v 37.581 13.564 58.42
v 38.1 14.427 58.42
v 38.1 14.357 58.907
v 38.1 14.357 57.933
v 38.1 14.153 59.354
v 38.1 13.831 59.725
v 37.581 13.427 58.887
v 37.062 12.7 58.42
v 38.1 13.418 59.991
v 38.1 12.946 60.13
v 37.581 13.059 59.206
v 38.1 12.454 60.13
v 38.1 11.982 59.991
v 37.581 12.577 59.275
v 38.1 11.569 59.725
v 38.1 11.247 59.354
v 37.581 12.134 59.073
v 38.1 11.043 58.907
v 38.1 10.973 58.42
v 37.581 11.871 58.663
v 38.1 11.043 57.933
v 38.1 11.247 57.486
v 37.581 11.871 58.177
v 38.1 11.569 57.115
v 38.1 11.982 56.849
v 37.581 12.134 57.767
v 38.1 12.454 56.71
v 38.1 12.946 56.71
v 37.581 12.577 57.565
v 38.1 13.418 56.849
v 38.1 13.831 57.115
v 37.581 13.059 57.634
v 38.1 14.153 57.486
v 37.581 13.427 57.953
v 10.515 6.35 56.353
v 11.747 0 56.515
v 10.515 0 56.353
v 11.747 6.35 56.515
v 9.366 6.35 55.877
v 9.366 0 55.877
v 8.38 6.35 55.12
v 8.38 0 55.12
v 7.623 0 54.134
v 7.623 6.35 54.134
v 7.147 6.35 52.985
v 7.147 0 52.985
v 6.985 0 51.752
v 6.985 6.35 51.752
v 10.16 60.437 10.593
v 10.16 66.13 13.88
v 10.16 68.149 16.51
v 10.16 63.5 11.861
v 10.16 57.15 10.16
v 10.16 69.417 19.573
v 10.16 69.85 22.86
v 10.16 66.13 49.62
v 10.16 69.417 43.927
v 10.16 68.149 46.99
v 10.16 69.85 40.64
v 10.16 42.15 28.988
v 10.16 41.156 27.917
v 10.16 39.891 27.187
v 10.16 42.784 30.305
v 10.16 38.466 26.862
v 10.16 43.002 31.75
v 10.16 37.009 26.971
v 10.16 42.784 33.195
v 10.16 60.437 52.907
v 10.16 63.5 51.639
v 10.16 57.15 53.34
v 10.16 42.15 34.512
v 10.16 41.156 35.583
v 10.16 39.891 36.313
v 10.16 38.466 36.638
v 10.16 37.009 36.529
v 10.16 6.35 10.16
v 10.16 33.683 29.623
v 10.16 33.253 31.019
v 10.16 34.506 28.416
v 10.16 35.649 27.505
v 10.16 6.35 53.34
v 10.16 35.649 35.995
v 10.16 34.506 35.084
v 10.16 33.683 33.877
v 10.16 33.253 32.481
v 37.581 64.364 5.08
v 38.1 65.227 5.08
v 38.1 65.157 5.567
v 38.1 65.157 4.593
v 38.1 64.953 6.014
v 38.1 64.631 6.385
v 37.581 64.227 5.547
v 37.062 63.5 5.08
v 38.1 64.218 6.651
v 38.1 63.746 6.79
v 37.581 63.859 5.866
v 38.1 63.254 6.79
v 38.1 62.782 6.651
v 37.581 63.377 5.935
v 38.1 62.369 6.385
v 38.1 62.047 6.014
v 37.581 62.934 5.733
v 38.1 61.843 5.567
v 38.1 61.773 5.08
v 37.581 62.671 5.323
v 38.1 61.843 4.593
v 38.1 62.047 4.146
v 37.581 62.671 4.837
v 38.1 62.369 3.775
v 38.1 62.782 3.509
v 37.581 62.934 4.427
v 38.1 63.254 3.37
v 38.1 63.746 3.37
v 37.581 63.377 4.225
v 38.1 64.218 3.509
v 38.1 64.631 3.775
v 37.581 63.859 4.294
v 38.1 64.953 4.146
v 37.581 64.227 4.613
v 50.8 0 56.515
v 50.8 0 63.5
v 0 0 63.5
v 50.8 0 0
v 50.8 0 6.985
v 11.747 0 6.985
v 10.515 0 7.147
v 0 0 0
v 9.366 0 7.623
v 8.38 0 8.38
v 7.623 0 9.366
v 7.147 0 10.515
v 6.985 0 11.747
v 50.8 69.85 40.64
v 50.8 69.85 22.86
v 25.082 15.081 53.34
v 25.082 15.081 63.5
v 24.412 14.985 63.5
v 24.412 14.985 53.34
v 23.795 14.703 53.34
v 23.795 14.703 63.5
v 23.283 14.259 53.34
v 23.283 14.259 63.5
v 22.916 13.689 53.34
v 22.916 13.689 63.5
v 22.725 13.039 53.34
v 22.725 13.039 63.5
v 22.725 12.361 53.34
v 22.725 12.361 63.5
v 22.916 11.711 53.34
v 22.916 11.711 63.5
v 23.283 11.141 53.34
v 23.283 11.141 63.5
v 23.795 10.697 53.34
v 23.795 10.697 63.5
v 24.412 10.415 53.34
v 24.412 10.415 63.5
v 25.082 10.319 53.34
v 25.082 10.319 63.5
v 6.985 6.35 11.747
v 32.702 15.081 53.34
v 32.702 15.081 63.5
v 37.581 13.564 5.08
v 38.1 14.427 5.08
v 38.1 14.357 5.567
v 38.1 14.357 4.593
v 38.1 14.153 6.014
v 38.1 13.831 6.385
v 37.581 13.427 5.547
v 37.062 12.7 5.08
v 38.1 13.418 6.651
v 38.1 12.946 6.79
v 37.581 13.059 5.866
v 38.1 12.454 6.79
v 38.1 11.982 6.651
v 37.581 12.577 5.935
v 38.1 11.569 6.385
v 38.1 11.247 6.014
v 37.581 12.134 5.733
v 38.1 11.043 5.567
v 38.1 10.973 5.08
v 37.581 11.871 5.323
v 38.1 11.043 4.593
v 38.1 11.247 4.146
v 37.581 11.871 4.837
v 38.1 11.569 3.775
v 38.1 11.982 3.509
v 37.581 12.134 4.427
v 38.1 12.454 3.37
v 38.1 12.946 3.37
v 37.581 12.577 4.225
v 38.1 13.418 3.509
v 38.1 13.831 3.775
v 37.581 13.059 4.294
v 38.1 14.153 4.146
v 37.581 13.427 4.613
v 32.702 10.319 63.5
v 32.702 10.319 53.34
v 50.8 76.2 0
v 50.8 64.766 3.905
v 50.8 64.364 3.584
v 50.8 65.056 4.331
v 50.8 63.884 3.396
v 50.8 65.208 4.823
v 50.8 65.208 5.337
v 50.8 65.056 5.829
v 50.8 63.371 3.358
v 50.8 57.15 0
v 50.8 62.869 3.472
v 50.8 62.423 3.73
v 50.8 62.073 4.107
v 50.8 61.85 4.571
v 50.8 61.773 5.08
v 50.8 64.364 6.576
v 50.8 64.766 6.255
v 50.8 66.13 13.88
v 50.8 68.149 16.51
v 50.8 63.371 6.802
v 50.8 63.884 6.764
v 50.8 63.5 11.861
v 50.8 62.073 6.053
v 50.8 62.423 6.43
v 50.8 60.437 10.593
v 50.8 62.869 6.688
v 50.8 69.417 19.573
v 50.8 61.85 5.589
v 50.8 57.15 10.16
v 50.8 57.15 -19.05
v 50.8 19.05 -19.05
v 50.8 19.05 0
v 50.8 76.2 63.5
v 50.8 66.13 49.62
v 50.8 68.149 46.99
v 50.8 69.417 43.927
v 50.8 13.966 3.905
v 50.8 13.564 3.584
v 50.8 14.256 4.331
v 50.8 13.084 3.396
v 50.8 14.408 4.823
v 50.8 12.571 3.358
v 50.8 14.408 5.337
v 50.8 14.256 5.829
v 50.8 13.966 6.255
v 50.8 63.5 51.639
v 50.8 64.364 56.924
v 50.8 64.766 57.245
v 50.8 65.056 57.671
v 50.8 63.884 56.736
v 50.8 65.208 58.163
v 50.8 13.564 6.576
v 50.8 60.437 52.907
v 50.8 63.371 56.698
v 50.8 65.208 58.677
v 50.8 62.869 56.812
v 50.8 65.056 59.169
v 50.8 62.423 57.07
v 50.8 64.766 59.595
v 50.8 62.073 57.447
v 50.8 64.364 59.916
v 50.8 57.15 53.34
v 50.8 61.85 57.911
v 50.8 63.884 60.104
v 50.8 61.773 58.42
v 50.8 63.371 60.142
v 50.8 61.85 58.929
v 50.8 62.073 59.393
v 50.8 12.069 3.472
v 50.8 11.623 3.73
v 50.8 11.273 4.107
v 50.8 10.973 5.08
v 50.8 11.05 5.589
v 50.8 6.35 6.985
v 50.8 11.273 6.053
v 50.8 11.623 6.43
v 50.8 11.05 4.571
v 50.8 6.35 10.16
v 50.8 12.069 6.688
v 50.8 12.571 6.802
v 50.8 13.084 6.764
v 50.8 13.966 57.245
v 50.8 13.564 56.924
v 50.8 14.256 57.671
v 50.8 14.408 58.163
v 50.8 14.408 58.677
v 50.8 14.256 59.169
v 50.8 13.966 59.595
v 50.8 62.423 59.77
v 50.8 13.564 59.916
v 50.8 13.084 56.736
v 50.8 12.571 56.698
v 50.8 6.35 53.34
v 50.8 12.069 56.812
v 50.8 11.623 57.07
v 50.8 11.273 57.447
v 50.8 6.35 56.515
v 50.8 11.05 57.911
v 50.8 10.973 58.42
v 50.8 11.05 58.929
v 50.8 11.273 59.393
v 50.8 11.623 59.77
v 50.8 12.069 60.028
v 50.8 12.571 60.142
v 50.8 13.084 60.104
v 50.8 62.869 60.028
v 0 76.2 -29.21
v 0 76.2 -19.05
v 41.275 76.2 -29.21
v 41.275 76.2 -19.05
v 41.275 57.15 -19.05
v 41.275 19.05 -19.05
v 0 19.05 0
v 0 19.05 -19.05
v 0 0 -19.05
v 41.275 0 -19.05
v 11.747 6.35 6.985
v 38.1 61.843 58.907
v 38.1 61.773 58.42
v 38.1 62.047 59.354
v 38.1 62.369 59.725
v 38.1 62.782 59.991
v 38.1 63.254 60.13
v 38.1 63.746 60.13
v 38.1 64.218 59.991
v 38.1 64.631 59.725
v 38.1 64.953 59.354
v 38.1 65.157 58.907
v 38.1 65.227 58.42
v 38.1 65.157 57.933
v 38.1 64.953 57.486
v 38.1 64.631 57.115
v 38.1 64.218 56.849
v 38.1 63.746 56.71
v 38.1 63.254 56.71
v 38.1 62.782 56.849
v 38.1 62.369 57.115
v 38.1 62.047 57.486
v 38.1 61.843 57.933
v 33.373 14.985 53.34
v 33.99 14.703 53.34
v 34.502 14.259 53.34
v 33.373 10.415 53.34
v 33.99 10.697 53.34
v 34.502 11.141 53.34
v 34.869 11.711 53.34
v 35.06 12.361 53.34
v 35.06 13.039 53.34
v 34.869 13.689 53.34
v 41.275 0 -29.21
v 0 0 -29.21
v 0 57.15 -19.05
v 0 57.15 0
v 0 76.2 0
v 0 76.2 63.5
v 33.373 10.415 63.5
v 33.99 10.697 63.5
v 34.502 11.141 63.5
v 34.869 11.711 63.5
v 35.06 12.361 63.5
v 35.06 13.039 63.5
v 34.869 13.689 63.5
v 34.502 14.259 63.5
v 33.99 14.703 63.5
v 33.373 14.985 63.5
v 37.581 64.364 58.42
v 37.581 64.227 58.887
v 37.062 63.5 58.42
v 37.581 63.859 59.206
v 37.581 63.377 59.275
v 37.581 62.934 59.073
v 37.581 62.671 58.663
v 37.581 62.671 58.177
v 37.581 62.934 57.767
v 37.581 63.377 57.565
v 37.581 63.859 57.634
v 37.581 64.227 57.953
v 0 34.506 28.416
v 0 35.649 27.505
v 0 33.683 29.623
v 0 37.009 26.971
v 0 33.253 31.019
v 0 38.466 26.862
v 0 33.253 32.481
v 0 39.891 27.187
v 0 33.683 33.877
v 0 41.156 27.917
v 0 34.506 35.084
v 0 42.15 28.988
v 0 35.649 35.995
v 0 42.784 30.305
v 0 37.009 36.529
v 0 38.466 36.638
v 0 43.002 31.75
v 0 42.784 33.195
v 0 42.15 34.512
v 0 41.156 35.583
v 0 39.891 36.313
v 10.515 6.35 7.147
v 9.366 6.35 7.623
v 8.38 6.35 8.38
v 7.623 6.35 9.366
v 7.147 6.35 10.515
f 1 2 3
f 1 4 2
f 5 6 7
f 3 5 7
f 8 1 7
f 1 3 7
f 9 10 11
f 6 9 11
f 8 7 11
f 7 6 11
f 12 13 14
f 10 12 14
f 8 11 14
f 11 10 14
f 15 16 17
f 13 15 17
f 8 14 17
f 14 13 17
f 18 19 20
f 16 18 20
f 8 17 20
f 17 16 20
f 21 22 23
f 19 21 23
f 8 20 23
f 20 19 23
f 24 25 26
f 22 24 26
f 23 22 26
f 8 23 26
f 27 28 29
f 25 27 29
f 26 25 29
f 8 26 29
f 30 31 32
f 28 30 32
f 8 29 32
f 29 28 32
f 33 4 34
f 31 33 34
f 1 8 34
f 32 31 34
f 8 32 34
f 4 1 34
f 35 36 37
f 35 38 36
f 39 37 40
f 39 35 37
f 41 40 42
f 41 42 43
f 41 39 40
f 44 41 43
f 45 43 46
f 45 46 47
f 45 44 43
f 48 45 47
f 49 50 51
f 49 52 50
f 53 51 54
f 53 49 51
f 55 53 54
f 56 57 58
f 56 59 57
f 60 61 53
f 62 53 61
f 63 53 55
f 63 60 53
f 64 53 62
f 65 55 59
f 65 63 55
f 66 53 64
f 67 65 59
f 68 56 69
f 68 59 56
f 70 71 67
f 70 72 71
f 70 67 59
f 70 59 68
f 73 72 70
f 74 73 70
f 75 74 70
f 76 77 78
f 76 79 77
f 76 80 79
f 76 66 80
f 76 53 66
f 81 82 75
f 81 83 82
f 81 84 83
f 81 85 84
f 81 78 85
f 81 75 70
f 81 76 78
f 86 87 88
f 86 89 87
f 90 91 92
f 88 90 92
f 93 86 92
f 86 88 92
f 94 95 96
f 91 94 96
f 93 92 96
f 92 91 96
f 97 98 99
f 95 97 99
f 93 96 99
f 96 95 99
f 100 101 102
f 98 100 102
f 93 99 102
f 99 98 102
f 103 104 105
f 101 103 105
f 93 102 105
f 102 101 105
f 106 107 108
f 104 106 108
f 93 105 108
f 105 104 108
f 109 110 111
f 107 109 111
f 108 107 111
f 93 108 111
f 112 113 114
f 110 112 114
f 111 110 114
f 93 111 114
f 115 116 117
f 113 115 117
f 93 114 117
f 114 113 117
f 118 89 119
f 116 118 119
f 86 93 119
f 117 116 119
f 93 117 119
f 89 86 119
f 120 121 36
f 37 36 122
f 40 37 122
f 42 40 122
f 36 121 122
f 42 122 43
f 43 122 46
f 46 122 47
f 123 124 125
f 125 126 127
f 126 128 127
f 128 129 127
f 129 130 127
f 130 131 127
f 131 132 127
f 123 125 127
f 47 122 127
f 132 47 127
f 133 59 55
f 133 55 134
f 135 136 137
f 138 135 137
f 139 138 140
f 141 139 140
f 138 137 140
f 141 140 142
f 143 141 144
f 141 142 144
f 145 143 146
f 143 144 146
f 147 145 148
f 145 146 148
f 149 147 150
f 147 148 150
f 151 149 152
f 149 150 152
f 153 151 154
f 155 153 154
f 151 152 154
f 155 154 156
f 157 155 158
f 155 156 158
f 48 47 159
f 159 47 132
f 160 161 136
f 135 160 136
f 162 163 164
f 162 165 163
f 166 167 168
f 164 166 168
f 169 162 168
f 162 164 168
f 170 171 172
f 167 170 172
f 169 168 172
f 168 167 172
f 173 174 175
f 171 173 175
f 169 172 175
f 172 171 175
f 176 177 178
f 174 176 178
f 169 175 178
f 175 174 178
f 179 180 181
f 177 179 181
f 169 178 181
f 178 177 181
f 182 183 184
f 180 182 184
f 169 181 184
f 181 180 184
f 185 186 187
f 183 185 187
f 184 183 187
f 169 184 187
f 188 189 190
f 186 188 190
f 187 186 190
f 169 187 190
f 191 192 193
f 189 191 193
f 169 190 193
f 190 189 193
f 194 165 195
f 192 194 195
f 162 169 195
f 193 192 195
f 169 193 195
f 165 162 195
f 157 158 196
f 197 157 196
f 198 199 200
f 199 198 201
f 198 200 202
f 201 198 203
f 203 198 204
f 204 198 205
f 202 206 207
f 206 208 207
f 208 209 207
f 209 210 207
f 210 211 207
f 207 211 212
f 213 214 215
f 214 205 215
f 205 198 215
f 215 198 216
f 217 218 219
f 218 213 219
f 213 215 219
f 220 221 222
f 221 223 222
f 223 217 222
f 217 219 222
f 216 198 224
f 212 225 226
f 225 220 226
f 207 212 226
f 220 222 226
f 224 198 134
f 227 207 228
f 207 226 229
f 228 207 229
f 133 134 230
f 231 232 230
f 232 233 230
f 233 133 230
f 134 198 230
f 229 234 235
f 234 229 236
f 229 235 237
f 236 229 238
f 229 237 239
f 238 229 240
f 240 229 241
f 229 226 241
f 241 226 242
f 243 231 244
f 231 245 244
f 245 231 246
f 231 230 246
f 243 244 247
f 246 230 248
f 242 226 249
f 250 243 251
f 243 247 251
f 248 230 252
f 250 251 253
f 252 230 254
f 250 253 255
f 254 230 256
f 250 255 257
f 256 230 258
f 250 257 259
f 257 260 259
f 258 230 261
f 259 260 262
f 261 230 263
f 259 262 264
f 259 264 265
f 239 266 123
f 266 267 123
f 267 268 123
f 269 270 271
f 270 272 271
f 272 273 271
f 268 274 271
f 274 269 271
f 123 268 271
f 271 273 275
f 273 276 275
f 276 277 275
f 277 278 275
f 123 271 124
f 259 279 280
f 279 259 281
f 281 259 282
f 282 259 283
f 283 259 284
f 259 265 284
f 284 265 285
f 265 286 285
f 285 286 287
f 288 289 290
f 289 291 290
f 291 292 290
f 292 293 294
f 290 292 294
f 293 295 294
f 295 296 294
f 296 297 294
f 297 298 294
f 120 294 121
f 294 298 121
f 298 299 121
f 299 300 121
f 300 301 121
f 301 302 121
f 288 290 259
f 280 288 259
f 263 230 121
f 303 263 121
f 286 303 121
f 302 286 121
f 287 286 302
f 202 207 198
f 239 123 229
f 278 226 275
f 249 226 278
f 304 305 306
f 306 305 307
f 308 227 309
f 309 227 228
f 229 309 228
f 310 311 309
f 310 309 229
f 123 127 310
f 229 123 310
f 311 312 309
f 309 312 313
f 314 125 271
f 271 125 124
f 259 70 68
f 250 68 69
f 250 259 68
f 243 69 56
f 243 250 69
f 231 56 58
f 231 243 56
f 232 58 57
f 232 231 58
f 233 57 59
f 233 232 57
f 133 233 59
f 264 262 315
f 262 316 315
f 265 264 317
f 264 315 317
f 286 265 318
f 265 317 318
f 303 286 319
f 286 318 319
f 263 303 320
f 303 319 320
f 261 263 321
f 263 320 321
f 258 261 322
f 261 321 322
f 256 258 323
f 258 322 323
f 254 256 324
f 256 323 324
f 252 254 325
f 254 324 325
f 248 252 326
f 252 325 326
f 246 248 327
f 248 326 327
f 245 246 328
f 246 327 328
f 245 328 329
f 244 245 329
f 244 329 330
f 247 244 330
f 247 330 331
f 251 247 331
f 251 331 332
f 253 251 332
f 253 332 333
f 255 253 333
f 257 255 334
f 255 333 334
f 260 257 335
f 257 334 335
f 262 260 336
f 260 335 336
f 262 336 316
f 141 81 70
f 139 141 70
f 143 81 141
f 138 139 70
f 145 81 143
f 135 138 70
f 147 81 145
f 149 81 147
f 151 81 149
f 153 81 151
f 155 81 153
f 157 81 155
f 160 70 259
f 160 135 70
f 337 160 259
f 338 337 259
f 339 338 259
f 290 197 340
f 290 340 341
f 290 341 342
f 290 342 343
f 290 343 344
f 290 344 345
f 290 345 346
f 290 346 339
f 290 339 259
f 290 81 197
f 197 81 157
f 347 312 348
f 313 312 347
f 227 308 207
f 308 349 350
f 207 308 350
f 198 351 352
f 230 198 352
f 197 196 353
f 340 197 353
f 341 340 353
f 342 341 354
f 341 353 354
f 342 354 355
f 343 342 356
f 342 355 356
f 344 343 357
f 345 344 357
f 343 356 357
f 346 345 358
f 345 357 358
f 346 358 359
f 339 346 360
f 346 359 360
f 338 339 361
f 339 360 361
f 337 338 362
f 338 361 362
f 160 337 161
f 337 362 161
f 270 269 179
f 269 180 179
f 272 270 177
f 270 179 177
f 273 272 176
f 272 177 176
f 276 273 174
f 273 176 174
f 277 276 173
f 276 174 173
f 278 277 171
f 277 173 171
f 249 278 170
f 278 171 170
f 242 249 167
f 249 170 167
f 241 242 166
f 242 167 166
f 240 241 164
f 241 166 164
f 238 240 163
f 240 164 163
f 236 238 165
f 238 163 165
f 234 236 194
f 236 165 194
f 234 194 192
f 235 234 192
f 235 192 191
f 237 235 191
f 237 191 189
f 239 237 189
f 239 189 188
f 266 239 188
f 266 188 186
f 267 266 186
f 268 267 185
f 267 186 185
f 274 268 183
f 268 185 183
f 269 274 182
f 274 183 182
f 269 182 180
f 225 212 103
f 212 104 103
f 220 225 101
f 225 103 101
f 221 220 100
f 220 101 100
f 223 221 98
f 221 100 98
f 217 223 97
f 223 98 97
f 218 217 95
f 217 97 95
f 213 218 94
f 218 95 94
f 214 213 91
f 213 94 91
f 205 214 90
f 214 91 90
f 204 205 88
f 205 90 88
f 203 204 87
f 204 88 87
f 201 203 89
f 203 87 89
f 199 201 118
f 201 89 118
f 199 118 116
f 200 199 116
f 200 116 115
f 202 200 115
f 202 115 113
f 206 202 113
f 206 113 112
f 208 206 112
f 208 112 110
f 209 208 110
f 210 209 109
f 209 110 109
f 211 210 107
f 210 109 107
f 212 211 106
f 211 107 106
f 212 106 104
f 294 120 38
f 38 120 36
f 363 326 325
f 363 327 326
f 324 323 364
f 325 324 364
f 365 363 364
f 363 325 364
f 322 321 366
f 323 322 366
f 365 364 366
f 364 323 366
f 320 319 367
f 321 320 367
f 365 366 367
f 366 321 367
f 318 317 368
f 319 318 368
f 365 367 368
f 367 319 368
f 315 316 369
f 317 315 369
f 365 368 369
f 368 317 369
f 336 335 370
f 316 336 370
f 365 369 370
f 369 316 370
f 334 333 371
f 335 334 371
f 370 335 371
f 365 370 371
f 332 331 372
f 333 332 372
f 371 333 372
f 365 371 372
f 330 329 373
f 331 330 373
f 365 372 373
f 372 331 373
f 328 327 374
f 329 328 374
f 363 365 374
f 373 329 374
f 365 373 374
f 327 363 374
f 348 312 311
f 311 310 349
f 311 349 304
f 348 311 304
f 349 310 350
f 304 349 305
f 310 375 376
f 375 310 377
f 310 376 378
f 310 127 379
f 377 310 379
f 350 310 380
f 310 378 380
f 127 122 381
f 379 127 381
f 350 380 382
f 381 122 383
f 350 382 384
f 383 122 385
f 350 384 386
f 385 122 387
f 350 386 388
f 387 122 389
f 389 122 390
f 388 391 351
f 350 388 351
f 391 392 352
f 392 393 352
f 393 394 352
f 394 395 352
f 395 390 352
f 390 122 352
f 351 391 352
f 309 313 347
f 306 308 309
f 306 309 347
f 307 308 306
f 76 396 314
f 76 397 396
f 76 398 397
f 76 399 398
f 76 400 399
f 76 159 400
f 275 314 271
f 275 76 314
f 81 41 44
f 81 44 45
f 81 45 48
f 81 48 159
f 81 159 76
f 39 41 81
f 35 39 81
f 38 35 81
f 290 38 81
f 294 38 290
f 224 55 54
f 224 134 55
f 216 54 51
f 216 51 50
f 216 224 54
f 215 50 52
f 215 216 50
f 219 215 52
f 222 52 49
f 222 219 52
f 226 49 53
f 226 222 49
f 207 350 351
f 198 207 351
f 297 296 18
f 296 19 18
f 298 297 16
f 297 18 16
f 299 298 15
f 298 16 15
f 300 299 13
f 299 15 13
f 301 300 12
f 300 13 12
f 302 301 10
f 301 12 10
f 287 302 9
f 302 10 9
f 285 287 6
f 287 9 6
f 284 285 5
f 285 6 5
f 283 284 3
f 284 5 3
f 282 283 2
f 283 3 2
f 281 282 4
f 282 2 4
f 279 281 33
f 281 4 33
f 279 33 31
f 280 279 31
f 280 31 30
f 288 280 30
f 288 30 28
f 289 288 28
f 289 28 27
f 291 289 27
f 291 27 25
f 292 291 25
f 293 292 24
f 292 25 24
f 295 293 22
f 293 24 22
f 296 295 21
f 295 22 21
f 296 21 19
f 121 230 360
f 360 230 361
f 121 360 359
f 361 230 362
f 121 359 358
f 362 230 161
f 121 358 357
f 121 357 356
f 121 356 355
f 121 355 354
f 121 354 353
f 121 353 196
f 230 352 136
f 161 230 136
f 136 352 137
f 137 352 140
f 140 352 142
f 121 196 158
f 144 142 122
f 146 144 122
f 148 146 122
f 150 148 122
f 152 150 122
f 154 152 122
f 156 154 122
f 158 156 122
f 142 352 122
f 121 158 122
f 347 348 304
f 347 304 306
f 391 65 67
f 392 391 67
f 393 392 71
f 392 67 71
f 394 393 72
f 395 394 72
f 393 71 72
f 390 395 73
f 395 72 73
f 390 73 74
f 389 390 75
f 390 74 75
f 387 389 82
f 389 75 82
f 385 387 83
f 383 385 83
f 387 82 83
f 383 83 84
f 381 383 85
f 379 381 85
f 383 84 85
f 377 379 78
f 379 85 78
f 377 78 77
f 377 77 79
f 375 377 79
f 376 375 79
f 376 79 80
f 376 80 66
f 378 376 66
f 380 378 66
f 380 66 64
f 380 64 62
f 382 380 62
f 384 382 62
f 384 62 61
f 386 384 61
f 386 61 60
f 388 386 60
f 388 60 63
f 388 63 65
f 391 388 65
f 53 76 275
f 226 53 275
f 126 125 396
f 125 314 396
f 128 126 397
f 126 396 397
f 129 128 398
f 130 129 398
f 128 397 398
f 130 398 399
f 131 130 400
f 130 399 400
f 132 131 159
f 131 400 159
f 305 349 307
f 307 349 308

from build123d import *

# Parameters (mm, degrees)
F0_W      = 38.1
F0_H      = 19.05
F1_DEPTH  = 50.8
F3_D      = 9.8044
F4_W      = 50.8
F4_H      = 19.05
F4_H_2    = 38.1
F5_DEPTH  = 12.7
F7_W      = 40.64
F7_H      = 43.18
F8_DEPTH  = 69.85
F9_W      = 40.64
F9_H      = 43.18
F10_DEPTH = 6.35
F12_DEPTH = 9.525
F14_D     = 3.4544
F14_DEPTH = 12.7
F14_TIP   = 1.0378064612
F15_R     = 12.7
F16_R     = 12.7
F17_R     = 4.7625
F19_DEPTH = 25.4
F20_W     = 41.275
F20_H     = 76.2
F21_DEPTH = 2.54


with BuildPart() as f1:
    # F0 (on Right) → F1 (new body)
    with BuildSketch(Plane.YZ):
        Polygon((0, 63.5), (0, 0), (19.05, 0), (57.15, 0), (76.2, 0), (76.2, 63.5), align=None)
        with Locations((38.1, -9.525)):
            Rectangle(F0_W, F0_H)
    extrude(amount=F1_DEPTH)

    # F3 (through all)
    with Locations(Plane(origin=(0, 0, 0), x_dir=(0, -1, 0), z_dir=(-1, 0, 0))):
        with Locations((-38.1, 31.75)):
            Hole(F3_D / 2)

    # F4 (on face) → F5 (join)
    with BuildSketch(Plane(origin=(0, 0, -19.05), x_dir=(1, 0, 0), z_dir=(0, 0, -1))):
        with Locations((25.4, -9.525)):
            Rectangle(F4_W, F4_H)
        with Locations((25.4, -66.675)):
            Rectangle(F4_W, F4_H)
        with Locations((25.4, -38.1)):
            Rectangle(F4_W, F4_H_2)
    extrude(amount=F5_DEPTH)

    # F7 (on face) → F8 (cut)
    with BuildSketch(Plane.XZ):
        with Locations((30.48, 31.75)):
            Rectangle(F7_W, F7_H)
    extrude(amount=-F8_DEPTH, mode=Mode.SUBTRACT)

    # F9 (on face) → F10 (cut)
    with BuildSketch(Plane.XZ):
        with Locations((30.48, 31.75)):
            Rectangle(F9_W, F9_H)
        Polygon((50.8, 53.34), (50.8, 56.515), (6.985, 56.515), (6.985, 6.985), (50.8, 6.985), (50.8, 10.16), (10.16, 10.16), (10.16, 53.34), align=None)
    extrude(amount=-F10_DEPTH, mode=Mode.SUBTRACT)

    # F11 (on face) → F12 (cut)
    with BuildSketch(Plane.YZ.offset(50.8)):
        Polygon((19.05, -19.05), (0, -19.05), (0, -31.75), (76.2, -31.75), (76.2, -19.05), (57.15, -19.05), align=None)
    extrude(amount=-F12_DEPTH, mode=Mode.SUBTRACT)

    # F14
    with Locations(Plane.YZ.offset(50.8)):
        with Locations((12.7, 58.42), (63.5, 58.42), (12.7, 5.08), (63.5, 5.08)):
            Hole(F14_D / 2, depth=F14_DEPTH)
            with Locations((0, 0, -(F14_DEPTH + F14_TIP / 2))):  # 118° drill point
                Cone(0, F14_D / 2, F14_TIP, mode=Mode.SUBTRACT)

    # F15
    f15_edges = [f1.edges().sort_by_distance(p)[0] for p in [
        (30.48, 69.85, 53.34),
    ]]
    fillet(f15_edges, radius=F15_R)

    # F16
    f16_edges = [f1.edges().sort_by_distance(p)[0] for p in [
        (30.48, 69.85, 10.16),
    ]]
    fillet(f16_edges, radius=F16_R)

    # F17
    f17_edges = [f1.edges().sort_by_distance(p)[0] for p in [
        (6.985, 3.175, 56.515),
        (6.985, 3.175, 6.985),
    ]]
    fillet(f17_edges, radius=F17_R)

    # F18 (on face) → F19 (cut)
    with BuildSketch(Plane.XY.offset(63.5)):
        with BuildLine():
            ThreePointArc((25.0825, 15.08125), (26.7662980227, 14.3837980227), (27.46375, 12.7))
            ThreePointArc((27.46375, 12.7), (26.7662980227, 11.0162019773), (25.0825, 10.31875))
            Line((25.0825, 10.31875), (32.7025, 10.31875))
            ThreePointArc((32.7025, 10.31875), (30.32125, 12.7), (32.7025, 15.08125))
            Line((32.7025, 15.08125), (25.0825, 15.08125))
        make_face()
        with BuildLine():
            ThreePointArc((35.08375, 12.7), (34.3862980227, 14.3837980227), (32.7025, 15.08125))
            ThreePointArc((32.7025, 15.08125), (30.32125, 12.7), (32.7025, 10.31875))
            ThreePointArc((32.7025, 10.31875), (34.3862980227, 11.0162019773), (35.08375, 12.7))
        make_face()
        with BuildLine():
            ThreePointArc((25.0825, 10.31875), (26.7662980227, 11.0162019773), (27.46375, 12.7))
            ThreePointArc((27.46375, 12.7), (26.7662980227, 14.3837980227), (25.0825, 15.08125))
            ThreePointArc((25.0825, 15.08125), (22.70125, 12.7), (25.0825, 10.31875))
        make_face()
    extrude(amount=-F19_DEPTH, mode=Mode.SUBTRACT)

    # F20 (on face) → F21 (cut)
    with BuildSketch(Plane(origin=(0, 0, -31.75), x_dir=(1, 0, 0), z_dir=(0, 0, -1))):
        with Locations((20.6375, -38.1)):
            Rectangle(F20_W, F20_H)
    extrude(amount=-F21_DEPTH, mode=Mode.SUBTRACT)


solid = f1.part
